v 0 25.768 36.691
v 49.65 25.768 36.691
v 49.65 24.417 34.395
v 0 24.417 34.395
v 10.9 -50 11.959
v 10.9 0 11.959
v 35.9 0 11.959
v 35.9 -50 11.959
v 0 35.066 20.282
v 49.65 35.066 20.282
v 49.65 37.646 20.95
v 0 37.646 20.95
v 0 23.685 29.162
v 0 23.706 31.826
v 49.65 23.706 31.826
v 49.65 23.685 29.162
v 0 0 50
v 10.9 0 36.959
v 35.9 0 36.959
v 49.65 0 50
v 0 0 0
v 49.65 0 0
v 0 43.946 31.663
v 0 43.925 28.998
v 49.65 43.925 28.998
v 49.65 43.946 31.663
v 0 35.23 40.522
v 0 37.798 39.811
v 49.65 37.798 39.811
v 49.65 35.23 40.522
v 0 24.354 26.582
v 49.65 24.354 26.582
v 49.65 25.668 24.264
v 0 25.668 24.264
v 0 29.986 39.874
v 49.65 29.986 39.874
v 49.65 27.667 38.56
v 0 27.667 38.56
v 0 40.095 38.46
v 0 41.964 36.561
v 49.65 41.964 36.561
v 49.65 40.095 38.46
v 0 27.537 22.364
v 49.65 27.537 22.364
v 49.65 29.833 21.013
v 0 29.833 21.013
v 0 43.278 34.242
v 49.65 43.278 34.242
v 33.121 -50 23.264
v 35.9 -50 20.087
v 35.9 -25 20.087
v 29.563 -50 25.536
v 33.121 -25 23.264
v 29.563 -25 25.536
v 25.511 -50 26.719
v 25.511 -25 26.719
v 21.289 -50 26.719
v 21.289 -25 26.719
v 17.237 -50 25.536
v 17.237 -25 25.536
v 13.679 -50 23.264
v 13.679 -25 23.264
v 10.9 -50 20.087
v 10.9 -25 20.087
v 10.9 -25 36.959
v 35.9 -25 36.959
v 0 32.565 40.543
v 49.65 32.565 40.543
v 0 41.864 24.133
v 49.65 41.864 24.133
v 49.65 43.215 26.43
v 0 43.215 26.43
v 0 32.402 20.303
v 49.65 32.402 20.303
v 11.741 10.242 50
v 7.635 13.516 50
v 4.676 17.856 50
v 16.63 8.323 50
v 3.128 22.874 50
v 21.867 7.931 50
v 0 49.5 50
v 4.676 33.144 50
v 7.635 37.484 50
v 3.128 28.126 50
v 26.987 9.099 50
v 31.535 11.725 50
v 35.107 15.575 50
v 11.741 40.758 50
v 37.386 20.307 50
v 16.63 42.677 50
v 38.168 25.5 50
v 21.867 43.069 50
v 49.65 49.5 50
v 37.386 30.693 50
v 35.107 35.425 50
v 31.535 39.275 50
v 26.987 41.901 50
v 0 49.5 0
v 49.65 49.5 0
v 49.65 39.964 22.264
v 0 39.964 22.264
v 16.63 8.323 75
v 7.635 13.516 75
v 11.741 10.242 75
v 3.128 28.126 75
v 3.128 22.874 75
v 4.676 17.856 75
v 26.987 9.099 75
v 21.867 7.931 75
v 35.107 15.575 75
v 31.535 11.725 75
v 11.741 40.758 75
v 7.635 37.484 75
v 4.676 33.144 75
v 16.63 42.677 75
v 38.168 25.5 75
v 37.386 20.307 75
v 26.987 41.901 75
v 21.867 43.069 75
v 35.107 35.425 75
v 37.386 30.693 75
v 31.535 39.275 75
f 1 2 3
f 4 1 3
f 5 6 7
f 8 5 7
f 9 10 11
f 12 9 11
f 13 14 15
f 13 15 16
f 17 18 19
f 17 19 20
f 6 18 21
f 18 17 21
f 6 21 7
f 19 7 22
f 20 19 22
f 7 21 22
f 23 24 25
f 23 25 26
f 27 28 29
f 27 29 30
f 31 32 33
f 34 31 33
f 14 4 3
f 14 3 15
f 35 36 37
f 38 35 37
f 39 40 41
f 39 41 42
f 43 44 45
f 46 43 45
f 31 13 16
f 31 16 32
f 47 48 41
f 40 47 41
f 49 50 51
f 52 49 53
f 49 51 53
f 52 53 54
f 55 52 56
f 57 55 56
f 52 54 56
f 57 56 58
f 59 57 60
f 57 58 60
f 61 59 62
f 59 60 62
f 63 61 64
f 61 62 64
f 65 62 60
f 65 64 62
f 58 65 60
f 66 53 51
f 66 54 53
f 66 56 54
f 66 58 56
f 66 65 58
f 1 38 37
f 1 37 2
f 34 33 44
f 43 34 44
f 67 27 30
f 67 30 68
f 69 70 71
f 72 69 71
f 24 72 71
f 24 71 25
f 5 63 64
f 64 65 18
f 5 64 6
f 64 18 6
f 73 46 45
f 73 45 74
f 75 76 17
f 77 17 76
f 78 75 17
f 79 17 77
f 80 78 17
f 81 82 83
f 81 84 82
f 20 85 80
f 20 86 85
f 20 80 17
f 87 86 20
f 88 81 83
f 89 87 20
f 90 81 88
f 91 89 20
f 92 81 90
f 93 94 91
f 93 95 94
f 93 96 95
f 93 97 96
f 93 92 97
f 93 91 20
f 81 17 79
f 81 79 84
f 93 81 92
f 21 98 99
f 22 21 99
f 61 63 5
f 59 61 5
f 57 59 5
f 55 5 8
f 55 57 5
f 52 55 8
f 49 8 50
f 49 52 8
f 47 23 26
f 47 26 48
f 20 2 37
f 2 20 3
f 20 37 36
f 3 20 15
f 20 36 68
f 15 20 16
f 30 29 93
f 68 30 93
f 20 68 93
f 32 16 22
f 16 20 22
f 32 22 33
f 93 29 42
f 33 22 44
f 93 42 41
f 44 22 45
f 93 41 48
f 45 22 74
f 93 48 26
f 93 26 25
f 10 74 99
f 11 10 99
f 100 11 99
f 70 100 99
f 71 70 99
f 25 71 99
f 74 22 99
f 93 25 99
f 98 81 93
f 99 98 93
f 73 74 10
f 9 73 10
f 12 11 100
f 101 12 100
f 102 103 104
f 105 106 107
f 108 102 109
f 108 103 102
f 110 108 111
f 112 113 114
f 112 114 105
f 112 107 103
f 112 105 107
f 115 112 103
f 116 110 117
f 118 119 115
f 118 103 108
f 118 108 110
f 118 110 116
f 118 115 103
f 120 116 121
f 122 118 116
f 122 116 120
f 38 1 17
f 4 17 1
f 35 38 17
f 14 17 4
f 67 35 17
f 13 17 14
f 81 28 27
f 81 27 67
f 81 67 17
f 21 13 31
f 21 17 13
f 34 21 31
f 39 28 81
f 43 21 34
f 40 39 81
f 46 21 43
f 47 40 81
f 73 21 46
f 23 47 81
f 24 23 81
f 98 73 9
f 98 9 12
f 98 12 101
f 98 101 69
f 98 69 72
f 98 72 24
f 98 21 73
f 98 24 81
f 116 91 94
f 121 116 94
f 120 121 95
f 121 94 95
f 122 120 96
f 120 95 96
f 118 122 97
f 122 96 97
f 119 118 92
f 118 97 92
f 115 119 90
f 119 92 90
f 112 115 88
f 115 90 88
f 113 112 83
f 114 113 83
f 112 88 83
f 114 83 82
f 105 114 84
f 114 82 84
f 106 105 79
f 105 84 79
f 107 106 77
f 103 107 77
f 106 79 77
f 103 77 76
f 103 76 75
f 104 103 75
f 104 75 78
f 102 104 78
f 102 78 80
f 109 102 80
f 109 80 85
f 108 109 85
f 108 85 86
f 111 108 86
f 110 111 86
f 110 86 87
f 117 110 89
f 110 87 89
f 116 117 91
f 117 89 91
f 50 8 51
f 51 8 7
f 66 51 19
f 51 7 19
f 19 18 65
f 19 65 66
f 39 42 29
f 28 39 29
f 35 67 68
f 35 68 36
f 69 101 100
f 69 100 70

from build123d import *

# Parameters (mm, degrees)
F0_W      = 49.6500022709
F0_H      = 49.5000034571
F1_DEPTH  = 50
F2_W      = 25
F2_H      = 25
F3_DEPTH  = 25
F4_R      = 17.6184560371
F5_DEPTH  = 25
F7_DEPTH  = 25
F8_DEPTH  = 25
F9_DEPTH  = 55
F10_DEPTH = 55
F11_DEPTH = 100
F13_DEPTH = 25


with BuildPart() as f1:
    # F0 (on Top) → F1 (new body)
    with BuildSketch(Plane.XY):
        with Locations((24.8250011355, 24.7500017285)):
            Rectangle(F0_W, F0_H)
    extrude(amount=F1_DEPTH)

    # F2 (on face) → F3 (join)
    with BuildSketch(Plane.XZ):
        with Locations((23.4000021592, 24.4588267358)):
            Rectangle(F2_W, F2_H)
    extrude(amount=F3_DEPTH)

    # F4 (on face) → F5 (join)
    with BuildSketch(Plane.XY.offset(50)):
        with Locations((20.5500014126, 25.5000013858)):
            Circle(F4_R)
    extrude(amount=F5_DEPTH)

    # F6 (on face) → F7 (join)
    with BuildSketch(Plane.YZ.offset(49.6500022709)):
        Polygon((23.6848843281, 29.1616055147), (24.3537883277, 26.5821856483), (25.6675029629, 24.2637824769), (27.5365007525, 22.3643913453), (29.8334125856, 21.0134526203), (32.4017077168, 20.3030305434), (35.066361077, 20.2815392052), (37.6457809434, 20.9504432048), (39.9641841148, 22.26415784), (41.8635752464, 24.1331556296), (43.2145139714, 26.4300674627), (43.9249360483, 28.9983625938), (43.9464273865, 31.6630159541), (43.2775233869, 34.2424358205), (41.9638087517, 36.5608389919), (40.0948109622, 38.4602301235), (37.797899129, 39.8111688485), (35.2296039979, 40.5215909253), (32.5649506376, 40.5430822636), (29.9855307712, 39.874178264), (27.6671275998, 38.5604636288), (25.7677364683, 36.6914658392), (24.4167977433, 34.3945540061), (23.7063756664, 31.826258875), align=None)
    extrude(amount=F7_DEPTH)

    # F8 (add): a face of the model
    f8_faces = [f1.faces().sort_by_distance(p)[0] for p in [
        (74.6500022709, 33.8156558573, 30.4123107344),
    ]]
    extrude(f8_faces, amount=F8_DEPTH)

    # F9 (cut): a face of the model
    f9_faces = [f1.faces().sort_by_distance(p)[0] for p in [
        (99.6500022709, 33.8156558573, 30.4123107344),
    ]]
    extrude(f9_faces, amount=-F9_DEPTH, mode=Mode.SUBTRACT)

    # F10 (add): a face of the model
    f10_faces = [f1.faces().sort_by_distance(p)[0] for p in [
        (44.6500022709, 33.8156558573, 30.4123107344),
    ]]
    extrude(f10_faces, amount=F10_DEPTH)

    # F11 (cut): a face of the model
    f11_faces = [f1.faces().sort_by_distance(p)[0] for p in [
        (99.6500022709, 33.8156558573, 30.4123107344),
    ]]
    extrude(f11_faces, amount=-F11_DEPTH, mode=Mode.SUBTRACT)

    # F12 (on face) → F13 (join)
    with BuildSketch(Plane.XZ.offset(25)):
        with BuildLine():
            Line((35.9000021592, 11.9588267358), (35.9000021592, 20.0868558522))
            ThreePointArc((35.9000021592, 20.0868558522), (23.4000021592, 26.8690533376), (10.9000021592, 20.0868558522))
            Line((10.9000021592, 20.0868558522), (10.9000021592, 11.9588267358))
            Line((10.9000021592, 11.9588267358), (35.9000021592, 11.9588267358))
        make_face()
    extrude(amount=F13_DEPTH)


solid = f1.part
